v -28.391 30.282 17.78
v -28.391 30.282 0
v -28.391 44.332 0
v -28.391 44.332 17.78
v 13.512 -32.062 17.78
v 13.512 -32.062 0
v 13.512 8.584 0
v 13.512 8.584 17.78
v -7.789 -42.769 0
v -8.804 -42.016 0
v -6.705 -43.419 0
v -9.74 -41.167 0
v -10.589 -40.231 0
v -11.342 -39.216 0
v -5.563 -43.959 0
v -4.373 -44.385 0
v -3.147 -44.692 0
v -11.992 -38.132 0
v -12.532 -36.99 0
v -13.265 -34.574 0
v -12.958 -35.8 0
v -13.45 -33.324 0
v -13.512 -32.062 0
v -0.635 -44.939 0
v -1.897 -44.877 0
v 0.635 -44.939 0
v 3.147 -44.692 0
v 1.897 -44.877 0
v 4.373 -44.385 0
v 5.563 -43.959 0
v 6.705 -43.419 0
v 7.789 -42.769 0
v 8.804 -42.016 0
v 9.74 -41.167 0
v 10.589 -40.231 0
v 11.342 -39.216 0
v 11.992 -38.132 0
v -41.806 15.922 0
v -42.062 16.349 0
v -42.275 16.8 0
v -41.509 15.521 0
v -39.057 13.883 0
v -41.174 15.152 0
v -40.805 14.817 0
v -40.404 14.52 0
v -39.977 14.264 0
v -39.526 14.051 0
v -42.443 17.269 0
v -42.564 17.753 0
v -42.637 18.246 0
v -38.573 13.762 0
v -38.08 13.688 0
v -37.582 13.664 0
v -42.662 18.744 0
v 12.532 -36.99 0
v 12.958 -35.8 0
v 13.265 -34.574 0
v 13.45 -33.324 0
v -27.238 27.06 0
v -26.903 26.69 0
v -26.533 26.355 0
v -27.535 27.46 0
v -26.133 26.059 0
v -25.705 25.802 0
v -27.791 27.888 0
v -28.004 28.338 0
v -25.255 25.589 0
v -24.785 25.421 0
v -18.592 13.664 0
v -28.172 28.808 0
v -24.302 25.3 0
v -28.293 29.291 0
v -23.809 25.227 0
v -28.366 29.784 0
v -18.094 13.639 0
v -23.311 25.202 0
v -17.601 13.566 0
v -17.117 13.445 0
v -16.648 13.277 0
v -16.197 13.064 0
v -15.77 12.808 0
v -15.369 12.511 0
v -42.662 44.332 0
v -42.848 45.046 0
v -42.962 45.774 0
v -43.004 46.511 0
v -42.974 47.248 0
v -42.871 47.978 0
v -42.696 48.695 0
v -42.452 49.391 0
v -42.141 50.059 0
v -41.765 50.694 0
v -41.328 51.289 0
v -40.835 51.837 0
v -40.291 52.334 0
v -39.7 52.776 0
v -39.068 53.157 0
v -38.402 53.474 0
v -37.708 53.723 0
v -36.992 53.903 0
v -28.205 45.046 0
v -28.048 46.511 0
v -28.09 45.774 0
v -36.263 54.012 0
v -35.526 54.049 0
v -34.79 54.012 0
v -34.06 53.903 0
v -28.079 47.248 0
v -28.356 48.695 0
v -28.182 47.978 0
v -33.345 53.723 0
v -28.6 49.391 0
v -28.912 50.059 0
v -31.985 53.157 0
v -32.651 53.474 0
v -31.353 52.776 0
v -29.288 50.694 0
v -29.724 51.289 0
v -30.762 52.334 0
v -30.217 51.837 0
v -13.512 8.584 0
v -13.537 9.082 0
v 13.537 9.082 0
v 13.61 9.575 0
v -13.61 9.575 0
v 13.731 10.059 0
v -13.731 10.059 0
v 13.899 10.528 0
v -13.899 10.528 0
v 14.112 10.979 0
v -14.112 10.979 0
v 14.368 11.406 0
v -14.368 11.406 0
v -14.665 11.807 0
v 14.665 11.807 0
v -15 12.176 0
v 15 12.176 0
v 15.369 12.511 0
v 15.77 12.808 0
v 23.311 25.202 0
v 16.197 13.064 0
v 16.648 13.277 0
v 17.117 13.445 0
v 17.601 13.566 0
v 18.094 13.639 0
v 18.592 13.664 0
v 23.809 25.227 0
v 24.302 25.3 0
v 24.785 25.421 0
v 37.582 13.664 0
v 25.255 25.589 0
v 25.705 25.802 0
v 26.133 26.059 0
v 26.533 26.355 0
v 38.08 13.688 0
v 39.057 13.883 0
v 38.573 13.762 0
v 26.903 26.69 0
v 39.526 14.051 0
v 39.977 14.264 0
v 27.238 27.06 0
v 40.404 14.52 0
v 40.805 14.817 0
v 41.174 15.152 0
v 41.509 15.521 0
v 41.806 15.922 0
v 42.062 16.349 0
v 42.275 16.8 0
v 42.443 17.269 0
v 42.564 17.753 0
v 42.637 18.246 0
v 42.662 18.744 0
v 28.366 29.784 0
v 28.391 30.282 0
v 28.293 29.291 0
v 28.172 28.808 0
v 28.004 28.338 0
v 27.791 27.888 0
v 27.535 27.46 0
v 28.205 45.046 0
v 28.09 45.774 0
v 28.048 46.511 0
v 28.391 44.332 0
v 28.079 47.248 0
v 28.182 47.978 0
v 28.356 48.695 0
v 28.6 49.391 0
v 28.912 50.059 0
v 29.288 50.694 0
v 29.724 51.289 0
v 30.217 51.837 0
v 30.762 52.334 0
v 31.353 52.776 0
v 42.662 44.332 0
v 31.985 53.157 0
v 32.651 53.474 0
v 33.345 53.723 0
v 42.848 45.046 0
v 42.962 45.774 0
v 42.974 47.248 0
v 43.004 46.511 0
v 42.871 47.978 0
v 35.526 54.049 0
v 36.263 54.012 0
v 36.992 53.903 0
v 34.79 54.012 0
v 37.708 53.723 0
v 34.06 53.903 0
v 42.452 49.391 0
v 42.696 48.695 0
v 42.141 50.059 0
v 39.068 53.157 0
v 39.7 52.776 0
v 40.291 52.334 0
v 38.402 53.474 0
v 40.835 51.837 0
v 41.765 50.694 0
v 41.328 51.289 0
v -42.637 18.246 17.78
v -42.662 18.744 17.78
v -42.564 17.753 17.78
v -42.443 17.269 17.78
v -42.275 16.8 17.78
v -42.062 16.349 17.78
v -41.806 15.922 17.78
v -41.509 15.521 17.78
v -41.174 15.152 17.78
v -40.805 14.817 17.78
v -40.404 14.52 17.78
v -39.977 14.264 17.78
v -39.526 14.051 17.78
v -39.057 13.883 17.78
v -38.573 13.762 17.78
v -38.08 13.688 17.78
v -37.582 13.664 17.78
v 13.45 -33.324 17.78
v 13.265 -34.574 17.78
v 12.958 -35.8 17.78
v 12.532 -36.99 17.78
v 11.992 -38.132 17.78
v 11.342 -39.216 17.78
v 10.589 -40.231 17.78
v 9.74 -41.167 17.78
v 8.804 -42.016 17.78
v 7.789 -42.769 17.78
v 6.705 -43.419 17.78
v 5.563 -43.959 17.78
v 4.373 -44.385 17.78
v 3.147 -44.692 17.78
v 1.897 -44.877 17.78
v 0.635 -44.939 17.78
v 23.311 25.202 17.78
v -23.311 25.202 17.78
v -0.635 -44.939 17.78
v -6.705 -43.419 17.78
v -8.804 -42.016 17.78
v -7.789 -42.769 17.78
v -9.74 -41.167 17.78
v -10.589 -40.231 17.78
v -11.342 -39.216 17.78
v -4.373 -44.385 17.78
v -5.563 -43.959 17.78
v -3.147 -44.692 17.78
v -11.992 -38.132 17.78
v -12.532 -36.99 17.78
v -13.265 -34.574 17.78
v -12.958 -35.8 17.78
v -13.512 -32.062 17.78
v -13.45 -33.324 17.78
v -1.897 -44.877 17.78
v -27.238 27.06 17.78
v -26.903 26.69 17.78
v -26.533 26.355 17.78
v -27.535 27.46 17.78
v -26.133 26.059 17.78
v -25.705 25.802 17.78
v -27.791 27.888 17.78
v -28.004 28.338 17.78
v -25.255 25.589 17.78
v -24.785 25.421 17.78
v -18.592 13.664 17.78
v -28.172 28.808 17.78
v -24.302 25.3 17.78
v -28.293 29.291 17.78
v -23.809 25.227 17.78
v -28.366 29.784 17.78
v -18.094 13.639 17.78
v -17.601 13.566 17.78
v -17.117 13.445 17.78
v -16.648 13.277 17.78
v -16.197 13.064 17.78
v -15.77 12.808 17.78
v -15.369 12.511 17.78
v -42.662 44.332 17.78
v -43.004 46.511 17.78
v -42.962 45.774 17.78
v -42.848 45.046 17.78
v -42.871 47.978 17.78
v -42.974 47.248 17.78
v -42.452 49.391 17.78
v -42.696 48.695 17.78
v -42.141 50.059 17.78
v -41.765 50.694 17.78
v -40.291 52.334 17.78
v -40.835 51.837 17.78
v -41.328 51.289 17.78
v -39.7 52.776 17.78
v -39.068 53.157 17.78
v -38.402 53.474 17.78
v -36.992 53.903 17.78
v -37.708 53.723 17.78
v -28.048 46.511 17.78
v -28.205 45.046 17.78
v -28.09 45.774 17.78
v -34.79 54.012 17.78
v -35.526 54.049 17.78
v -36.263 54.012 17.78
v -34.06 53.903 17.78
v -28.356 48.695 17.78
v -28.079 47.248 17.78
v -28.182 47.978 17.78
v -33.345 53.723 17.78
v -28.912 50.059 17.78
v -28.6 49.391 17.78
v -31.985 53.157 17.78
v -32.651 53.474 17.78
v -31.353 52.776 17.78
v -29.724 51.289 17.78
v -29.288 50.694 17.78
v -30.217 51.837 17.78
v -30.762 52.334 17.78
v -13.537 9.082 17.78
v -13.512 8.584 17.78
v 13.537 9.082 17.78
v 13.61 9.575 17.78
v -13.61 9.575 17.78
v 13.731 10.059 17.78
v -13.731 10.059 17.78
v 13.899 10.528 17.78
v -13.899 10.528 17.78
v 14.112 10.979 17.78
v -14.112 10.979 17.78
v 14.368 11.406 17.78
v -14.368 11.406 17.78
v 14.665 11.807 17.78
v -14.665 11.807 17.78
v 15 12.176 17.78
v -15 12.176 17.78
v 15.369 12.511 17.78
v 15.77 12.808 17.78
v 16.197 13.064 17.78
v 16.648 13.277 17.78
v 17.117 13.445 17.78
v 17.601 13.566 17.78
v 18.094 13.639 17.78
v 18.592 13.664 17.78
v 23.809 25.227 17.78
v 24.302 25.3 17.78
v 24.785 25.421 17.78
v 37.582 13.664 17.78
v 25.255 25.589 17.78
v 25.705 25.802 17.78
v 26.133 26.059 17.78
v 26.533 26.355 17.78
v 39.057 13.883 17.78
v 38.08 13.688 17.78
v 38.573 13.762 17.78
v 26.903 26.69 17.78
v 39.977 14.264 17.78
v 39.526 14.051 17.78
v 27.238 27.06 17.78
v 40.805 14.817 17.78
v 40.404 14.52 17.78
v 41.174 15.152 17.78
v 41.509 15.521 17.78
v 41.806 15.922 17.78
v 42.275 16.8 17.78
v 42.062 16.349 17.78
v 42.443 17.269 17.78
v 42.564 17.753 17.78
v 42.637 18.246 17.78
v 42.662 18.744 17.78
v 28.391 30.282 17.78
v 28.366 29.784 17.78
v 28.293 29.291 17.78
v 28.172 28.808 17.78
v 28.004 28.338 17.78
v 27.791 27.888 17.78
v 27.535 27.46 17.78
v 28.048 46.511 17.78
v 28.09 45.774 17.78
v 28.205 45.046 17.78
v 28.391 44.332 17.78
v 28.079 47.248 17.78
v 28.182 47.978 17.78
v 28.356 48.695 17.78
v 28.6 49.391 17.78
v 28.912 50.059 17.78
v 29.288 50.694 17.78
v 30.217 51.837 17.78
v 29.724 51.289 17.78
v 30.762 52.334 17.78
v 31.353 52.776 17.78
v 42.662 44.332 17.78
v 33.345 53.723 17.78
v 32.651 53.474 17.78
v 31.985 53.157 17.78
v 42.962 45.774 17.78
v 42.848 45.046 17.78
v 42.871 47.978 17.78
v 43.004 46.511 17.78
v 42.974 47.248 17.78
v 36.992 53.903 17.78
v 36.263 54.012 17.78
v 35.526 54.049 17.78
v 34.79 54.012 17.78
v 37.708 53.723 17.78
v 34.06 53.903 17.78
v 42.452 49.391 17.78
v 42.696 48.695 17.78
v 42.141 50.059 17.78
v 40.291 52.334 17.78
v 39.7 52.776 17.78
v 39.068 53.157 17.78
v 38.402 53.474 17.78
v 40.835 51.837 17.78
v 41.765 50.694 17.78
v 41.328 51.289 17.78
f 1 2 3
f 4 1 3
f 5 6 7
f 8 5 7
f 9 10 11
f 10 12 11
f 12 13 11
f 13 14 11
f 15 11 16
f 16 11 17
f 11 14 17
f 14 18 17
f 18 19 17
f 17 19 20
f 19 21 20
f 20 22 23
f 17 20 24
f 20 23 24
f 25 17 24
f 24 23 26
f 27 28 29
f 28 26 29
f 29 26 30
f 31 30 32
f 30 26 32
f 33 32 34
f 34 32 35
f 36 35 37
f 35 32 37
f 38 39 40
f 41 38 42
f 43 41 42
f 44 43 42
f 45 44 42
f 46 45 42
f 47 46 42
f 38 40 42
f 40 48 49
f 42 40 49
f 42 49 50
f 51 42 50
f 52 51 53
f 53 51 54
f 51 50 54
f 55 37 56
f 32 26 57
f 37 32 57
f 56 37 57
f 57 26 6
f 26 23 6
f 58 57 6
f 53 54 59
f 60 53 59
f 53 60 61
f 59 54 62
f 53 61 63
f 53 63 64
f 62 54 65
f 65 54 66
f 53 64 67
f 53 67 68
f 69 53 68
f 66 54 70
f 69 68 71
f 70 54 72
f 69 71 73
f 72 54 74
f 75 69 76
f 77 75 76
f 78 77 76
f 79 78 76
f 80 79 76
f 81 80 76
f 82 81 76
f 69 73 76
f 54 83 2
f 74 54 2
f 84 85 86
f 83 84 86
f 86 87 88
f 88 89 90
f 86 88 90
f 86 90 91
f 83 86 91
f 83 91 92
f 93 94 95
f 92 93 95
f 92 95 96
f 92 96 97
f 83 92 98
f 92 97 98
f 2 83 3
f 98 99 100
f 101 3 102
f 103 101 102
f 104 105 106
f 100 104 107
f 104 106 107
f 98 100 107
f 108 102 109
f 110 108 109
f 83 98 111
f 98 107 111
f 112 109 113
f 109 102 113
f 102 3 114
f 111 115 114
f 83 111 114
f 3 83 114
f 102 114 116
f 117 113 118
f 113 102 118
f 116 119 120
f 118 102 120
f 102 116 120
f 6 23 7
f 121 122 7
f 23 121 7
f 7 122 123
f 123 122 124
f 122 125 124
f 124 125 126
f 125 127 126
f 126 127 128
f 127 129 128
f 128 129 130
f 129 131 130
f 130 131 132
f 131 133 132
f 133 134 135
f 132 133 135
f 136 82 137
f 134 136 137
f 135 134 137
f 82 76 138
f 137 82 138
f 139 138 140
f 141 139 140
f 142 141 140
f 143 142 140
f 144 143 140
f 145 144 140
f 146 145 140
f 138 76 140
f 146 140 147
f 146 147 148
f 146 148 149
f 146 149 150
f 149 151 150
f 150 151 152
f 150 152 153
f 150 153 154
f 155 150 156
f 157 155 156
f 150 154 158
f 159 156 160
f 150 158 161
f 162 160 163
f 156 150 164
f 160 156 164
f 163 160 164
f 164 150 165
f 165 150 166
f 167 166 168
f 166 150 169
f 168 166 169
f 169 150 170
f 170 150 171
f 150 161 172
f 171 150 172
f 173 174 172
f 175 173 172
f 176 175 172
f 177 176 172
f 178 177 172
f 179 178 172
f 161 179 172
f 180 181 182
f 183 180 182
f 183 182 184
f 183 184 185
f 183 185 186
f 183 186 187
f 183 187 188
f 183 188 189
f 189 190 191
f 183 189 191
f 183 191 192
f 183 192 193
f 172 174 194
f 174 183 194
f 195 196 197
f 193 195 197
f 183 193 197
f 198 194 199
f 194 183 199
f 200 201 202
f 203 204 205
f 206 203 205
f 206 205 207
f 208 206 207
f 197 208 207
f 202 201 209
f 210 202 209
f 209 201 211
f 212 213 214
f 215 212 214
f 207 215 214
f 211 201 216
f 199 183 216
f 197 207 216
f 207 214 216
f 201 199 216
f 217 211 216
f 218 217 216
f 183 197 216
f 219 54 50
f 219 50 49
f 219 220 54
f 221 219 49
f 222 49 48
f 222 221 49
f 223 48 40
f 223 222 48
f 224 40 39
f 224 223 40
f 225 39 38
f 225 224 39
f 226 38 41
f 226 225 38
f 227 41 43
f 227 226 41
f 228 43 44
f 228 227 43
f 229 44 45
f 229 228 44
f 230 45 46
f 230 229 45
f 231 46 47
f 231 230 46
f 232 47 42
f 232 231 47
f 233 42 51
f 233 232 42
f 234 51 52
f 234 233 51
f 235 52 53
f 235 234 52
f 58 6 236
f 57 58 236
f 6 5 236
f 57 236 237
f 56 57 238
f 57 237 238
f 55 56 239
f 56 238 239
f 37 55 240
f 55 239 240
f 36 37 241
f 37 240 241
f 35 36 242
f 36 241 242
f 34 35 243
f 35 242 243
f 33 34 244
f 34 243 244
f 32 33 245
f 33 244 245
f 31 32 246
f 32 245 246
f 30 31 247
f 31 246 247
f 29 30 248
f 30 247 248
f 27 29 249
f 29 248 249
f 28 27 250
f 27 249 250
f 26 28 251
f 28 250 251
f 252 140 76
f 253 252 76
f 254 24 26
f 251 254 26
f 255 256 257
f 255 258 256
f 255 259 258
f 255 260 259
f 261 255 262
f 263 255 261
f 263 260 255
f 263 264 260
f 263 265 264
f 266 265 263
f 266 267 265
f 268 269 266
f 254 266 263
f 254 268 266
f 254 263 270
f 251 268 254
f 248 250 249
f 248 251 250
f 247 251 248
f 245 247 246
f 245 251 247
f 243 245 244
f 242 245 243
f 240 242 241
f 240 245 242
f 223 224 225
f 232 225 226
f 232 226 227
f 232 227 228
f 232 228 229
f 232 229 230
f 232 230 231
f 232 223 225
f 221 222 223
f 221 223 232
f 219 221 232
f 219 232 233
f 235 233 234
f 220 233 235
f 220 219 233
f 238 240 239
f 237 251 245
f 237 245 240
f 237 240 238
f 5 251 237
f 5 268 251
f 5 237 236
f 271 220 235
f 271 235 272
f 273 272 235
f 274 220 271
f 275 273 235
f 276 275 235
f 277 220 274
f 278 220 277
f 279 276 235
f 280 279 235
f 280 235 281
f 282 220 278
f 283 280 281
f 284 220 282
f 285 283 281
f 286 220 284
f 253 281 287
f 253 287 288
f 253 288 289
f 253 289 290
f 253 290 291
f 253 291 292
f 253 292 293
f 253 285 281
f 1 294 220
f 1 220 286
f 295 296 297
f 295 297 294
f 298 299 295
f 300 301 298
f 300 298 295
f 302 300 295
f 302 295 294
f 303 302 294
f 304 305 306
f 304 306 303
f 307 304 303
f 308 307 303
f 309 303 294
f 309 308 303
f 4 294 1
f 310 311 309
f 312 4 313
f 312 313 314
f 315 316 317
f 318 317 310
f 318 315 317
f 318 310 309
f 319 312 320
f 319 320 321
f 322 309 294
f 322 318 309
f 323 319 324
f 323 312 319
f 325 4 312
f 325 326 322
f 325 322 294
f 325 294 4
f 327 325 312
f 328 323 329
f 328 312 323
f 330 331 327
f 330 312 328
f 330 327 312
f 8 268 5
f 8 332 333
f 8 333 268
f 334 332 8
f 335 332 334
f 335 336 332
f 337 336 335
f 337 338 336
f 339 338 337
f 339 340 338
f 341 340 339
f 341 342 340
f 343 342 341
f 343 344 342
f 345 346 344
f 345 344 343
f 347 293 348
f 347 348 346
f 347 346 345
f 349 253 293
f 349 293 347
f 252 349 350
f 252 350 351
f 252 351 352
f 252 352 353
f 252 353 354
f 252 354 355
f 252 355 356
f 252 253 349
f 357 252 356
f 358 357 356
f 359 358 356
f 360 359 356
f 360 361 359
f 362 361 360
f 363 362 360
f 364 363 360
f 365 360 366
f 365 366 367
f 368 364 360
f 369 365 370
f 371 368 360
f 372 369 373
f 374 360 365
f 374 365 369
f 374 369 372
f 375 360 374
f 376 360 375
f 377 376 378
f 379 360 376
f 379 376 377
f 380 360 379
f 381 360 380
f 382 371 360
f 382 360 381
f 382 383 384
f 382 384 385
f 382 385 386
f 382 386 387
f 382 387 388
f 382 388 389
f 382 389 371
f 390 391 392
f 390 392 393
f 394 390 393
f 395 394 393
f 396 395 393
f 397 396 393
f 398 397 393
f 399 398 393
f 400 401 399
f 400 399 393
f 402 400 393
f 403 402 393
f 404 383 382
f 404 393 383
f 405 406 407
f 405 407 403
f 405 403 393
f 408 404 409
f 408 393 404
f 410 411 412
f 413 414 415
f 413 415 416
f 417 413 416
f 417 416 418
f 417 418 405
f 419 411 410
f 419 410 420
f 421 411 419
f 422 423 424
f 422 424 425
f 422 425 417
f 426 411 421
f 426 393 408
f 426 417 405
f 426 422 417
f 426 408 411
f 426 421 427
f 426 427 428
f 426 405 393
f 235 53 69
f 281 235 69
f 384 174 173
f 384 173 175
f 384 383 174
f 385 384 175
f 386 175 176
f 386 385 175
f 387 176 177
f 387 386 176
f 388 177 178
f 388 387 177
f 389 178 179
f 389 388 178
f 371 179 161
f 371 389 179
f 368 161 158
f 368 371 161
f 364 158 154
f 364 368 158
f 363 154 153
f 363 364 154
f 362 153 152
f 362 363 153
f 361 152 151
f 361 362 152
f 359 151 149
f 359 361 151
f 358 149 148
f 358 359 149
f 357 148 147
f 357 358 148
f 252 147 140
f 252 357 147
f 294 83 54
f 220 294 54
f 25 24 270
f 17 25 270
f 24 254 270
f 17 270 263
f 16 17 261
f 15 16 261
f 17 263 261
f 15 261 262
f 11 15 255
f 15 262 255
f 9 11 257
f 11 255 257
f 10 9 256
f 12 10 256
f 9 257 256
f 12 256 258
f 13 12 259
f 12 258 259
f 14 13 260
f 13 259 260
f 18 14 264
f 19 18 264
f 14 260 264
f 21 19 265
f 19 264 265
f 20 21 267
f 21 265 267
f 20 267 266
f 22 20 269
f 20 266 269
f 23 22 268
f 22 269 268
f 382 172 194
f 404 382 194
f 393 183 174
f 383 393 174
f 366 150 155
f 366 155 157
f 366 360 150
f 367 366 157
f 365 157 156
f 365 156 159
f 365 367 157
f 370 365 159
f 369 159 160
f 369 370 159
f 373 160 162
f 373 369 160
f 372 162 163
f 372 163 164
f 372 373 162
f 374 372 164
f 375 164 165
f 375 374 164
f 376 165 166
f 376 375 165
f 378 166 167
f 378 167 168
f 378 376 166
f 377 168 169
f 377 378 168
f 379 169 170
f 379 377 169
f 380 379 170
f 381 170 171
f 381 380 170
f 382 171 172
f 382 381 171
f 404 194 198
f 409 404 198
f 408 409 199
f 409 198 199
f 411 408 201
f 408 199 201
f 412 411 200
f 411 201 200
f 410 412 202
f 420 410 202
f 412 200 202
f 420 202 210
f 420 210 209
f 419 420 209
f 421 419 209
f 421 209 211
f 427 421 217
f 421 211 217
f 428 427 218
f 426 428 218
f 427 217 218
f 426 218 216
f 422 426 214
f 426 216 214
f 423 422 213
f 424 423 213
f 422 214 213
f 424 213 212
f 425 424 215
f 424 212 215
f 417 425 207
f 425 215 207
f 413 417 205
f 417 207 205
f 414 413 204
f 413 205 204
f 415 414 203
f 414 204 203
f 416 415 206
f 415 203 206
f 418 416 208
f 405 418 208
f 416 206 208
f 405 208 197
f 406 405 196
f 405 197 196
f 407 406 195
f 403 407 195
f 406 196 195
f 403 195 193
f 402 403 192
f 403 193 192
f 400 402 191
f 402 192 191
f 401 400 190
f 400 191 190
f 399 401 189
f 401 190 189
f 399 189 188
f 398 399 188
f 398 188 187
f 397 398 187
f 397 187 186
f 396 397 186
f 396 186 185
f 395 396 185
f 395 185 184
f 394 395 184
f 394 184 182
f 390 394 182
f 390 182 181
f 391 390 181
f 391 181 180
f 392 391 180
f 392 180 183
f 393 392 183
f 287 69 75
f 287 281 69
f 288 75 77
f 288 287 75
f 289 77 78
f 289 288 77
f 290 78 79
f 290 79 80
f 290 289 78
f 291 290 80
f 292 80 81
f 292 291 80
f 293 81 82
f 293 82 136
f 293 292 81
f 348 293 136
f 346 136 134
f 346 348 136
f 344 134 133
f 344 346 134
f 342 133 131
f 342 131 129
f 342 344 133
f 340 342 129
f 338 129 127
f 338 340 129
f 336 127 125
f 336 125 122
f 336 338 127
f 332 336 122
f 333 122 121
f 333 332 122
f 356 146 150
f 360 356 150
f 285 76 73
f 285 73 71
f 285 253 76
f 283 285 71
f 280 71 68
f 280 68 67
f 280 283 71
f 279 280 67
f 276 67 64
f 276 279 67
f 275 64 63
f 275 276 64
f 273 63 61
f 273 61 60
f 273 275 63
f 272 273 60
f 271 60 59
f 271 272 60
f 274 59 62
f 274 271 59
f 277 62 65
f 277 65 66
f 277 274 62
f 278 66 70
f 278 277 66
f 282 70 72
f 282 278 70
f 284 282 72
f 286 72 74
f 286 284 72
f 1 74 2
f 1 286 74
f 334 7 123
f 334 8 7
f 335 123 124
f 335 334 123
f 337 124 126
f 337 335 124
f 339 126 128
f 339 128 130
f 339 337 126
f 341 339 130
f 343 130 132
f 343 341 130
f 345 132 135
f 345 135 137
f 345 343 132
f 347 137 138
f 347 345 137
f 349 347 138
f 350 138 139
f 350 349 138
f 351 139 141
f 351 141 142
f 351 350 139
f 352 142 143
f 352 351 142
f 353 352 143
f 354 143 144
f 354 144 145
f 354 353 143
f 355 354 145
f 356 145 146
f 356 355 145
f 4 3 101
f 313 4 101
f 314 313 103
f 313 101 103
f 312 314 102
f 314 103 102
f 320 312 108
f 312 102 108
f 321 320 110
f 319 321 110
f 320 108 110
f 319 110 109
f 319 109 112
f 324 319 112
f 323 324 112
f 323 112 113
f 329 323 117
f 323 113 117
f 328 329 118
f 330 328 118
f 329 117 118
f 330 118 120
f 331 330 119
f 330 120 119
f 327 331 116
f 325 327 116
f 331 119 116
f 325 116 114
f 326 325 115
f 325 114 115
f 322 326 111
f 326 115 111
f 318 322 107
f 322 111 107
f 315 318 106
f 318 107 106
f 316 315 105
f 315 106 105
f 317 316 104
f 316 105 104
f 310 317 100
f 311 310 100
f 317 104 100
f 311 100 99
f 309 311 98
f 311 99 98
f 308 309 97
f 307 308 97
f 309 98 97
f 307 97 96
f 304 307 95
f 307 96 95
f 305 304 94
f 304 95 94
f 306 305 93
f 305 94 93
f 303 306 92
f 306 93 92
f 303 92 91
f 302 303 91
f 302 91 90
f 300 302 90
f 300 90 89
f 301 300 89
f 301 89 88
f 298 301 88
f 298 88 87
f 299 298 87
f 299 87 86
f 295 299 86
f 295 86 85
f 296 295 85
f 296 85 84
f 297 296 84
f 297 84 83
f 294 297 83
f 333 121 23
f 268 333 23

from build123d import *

# Parameters (mm, degrees)
F1_DEPTH = 17.78
F2_R     = 5.08
F3_R     = 12.877415


with BuildPart() as f1:
    # F0 (on Top) → F1 (new body)
    with BuildSketch(Plane.XY):
        with BuildLine():
            Line((-13.512124, -44.939205), (0, -44.939205))
            Line((0, -44.939205), (13.512124, -44.939205))
            Line((13.512124, -44.939205), (13.512124, 13.663948))
            Line((13.512124, 13.663948), (42.661879, 13.663948))
            Line((42.661879, 13.663948), (42.661879, 44.331919))
            ThreePointArc((42.661879, 44.331919), (35.526263, 54.048505), (28.390646, 44.331919))
            Line((28.390646, 44.331919), (28.390646, 25.202392))
            Line((28.390646, 25.202392), (0, 25.202392))
            Line((0, 25.202392), (-28.390646, 25.202392))
            Line((-28.390646, 25.202392), (-28.390646, 44.331919))
            ThreePointArc((-28.390646, 44.331919), (-35.526263, 54.048505), (-42.661879, 44.331919))
            Line((-42.661879, 44.331919), (-42.661879, 13.663948))
            Line((-42.661879, 13.663948), (-13.512124, 13.663948))
            Line((-13.512124, 13.663948), (-13.512124, -44.939205))
        make_face()
    extrude(amount=F1_DEPTH)

    # F2
    f2_edges = [f1.edges().sort_by_distance(p)[0] for p in [
        (-42.661879, 13.663948, 8.89),
        (-13.512124, 13.663948, 8.89),
        (42.661879, 13.663948, 8.89),
        (13.512124, 13.663948, 8.89),
        (28.390646, 25.202392, 8.89),
        (-28.390646, 25.202392, 8.89),
    ]]
    fillet(f2_edges, radius=F2_R)

    # F3
    f3_edges = [f1.edges().sort_by_distance(p)[0] for p in [
        (-13.512124, -44.939205, 8.89),
        (13.512124, -44.939205, 8.89),
    ]]
    fillet(f3_edges, radius=F3_R)


solid = f1.part
